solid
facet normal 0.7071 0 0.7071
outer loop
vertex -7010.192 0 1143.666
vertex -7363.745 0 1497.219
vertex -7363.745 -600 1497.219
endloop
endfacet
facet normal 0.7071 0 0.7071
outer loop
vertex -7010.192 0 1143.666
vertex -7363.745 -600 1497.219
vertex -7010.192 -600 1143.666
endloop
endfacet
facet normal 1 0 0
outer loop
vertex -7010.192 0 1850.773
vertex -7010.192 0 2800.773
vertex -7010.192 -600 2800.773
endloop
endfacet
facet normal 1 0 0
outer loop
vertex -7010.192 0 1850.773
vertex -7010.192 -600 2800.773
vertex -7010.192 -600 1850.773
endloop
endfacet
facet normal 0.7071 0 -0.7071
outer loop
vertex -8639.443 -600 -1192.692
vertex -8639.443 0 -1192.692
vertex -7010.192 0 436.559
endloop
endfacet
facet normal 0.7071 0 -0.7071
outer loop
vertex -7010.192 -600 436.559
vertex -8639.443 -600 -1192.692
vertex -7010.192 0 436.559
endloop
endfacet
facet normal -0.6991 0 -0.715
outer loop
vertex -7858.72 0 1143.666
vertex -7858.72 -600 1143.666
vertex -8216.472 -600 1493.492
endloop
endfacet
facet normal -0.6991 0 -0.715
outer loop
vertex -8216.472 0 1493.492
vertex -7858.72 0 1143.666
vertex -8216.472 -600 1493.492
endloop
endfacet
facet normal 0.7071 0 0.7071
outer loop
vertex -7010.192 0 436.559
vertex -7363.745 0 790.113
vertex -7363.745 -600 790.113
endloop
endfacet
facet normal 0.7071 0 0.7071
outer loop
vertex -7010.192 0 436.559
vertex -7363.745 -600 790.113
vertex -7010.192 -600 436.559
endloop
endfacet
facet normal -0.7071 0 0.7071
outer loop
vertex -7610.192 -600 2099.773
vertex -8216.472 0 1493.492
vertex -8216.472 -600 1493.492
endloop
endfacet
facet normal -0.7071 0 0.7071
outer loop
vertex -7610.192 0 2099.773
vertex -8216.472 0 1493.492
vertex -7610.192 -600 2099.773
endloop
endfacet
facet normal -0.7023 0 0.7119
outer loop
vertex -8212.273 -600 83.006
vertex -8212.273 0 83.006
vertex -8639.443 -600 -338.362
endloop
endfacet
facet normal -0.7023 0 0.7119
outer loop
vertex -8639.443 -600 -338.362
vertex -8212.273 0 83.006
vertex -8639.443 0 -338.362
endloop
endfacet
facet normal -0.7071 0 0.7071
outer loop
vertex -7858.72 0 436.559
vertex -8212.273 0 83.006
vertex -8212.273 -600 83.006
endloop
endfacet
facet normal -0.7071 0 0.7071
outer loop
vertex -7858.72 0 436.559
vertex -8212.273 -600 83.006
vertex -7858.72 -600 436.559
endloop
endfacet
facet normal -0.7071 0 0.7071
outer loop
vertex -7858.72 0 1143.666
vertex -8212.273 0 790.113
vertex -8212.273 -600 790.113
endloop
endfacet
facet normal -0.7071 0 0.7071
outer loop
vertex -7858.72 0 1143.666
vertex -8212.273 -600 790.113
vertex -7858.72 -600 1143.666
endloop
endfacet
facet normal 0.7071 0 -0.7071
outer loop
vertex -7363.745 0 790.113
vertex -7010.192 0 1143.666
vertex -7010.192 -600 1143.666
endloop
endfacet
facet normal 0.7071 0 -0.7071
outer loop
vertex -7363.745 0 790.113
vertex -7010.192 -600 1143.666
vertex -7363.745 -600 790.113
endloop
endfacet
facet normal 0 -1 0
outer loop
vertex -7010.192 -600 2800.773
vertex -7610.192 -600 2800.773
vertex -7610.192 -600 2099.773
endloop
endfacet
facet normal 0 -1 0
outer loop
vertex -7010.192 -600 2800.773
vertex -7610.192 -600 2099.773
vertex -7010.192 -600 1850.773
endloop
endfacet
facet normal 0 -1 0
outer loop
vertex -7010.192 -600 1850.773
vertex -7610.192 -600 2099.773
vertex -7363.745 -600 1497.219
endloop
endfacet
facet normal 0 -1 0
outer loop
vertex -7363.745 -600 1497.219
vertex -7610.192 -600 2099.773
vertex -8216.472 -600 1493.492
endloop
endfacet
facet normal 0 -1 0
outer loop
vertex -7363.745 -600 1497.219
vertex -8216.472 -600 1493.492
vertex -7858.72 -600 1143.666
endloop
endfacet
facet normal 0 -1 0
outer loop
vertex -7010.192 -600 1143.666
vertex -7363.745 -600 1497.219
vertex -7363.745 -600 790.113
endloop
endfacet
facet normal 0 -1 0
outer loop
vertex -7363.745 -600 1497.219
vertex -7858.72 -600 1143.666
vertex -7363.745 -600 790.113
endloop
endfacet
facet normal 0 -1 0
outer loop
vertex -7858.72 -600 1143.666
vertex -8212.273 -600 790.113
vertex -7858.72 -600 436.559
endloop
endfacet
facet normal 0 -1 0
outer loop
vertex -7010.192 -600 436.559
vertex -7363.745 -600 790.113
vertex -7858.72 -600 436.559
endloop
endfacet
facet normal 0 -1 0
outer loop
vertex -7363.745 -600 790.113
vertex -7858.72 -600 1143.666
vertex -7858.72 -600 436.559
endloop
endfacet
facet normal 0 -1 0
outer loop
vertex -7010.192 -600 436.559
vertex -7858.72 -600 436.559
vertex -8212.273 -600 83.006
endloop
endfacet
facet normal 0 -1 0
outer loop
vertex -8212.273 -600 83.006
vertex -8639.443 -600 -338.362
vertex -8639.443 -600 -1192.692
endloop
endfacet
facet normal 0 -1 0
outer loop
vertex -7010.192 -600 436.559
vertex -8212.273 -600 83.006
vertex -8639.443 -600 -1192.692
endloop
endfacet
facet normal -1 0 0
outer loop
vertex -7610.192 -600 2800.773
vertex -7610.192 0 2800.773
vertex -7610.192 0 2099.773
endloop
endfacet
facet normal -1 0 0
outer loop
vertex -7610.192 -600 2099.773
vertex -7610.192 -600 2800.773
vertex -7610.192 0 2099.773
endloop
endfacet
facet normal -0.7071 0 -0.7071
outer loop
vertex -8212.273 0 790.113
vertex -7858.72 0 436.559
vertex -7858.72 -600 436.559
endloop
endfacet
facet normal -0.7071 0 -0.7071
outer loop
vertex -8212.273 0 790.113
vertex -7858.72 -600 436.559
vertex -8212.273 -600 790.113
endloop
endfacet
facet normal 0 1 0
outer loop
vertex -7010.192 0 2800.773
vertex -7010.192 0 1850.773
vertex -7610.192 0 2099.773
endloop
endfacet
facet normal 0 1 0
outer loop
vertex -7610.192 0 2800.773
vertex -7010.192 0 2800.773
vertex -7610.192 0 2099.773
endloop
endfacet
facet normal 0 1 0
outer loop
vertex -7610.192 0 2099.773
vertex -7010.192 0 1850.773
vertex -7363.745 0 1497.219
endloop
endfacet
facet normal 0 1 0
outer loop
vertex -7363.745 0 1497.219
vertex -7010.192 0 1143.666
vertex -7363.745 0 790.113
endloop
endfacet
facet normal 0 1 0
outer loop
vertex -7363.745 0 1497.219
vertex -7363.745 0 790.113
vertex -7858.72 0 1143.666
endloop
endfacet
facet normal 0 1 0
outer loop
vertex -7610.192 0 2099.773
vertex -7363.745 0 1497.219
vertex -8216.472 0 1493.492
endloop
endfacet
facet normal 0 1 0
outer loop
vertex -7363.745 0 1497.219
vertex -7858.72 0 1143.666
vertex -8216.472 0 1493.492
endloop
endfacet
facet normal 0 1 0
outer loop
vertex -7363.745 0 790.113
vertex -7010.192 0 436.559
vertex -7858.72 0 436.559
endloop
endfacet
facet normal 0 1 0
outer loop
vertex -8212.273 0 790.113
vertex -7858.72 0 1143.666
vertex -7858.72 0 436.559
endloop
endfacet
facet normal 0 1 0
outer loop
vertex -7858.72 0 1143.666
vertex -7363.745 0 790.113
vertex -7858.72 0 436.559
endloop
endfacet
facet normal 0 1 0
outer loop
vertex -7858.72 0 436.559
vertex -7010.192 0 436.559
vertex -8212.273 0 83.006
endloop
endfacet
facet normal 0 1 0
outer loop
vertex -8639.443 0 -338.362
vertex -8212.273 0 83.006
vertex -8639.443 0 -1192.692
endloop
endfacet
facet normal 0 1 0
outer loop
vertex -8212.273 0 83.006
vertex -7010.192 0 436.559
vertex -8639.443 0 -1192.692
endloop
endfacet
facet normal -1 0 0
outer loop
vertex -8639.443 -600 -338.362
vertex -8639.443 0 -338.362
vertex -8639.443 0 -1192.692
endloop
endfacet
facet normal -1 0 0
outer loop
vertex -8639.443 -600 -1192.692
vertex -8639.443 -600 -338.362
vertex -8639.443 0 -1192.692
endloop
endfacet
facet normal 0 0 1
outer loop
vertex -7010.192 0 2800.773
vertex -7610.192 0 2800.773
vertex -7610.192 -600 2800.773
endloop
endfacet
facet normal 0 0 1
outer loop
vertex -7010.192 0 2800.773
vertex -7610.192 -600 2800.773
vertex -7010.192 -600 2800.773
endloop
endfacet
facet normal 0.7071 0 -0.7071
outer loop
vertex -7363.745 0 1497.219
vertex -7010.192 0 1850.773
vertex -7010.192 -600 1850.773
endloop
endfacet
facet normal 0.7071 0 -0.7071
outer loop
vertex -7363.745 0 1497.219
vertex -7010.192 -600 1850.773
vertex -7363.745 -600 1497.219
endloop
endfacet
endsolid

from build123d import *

# Parameters (mm, degrees)
BOSS_EXTRUDE1_DEPTH      = 600
CUT_EXTRUDE9_DEPTH       = 8723.868006427
CUT_EXTRUDE9_DEPTH_BACK  = 8723.868006427
CUT_EXTRUDE_THIN1_DEPTH  = 8723.868006427
CUT_EXTRUDE40_DEPTH      = 400
CUT_EXTRUDE42_DEPTH      = 8272.33671098
CUT_EXTRUDE42_DEPTH_BACK = 8272.33671098
CUT_EXTRUDE43_DEPTH      = 200
CUT_EXTRUDE44_DEPTH      = 8662.204945729
CUT_EXTRUDE44_DEPTH_BACK = 8662.204945729
SKETCH20_W               = 1000
SKETCH20_H               = 600
CUT_EXTRUDE45_DEPTH      = 600
CUT_EXTRUDE46_DEPTH      = 600
BOSS_EXTRUDE2_DEPTH      = 600
BOSS_EXTRUDE3_DEPTH      = 600
BOSS_EXTRUDE4_DEPTH      = 600
BOSS_EXTRUDE5_REACH      = 8720.017
SKETCH27_W               = 600.055718855
SKETCH27_H               = 600
SKETCH41_W               = 5944.592645119
SKETCH41_H               = 1845.640359894
CUT_EXTRUDE49_DEPTH      = 10020
SKETCH42_W               = 3231.101034248
SKETCH42_H               = 2243.42822902
CUT_EXTRUDE50_DEPTH      = 10020


with BuildPart() as part:
    # Sketch1 → Boss-Extrude1 (new body)
    with BuildSketch(Plane(origin=(0, 0, 0), x_dir=(1, 0, 0), z_dir=(0, 1, 0))):
        Polygon((0, 0), (-1000, 0), (-2062.518408918, -284.700949613), (-3015.146353081, -834.700949613), (-3792.963812386, -1612.518408918), (-4570.781271691, -2390.335868223), (-4695.045340403, -2485.687041782), (-5647.673284566, -3035.687041782), (-5792.381857505, -3095.627295285), (-6854.900266423, -3380.328244897), (-7010.191693484, -3400.772749124), (-8010.191693484, -3400.772749124), (-8010.191693484, -2800.772749124), (-7010.191693484, -2800.772749124), (-5947.673284566, -2516.071799511), (-4995.045340403, -1966.071799511), (-4217.227881098, -1188.254340206), (-3439.410421793, -410.436880901), (-3315.146353081, -315.085707342), (-2362.518408918, 234.914292658), (-2217.809835979, 294.854546161), (-1155.291427062, 579.555495773), (-1000, 600), (0, 600), align=None)
    extrude(amount=-BOSS_EXTRUDE1_DEPTH)

    # Sketch7 → Cut-Extrude9 (cut, two sides)
    with BuildSketch(Plane.XY) as cut_extrude9_sk:
        Polygon((-1000, 14081.643483175), (-1000, 0), (-1000, -600), (-2062.518408918, -400), (-3015.146353081, -400), (-3015.146353081, 0), (-3015.146353081, 14081.643483175), (-3015.146353081, 42244.930449524), (-1000, 42244.930449524), align=None)
    extrude(amount=CUT_EXTRUDE9_DEPTH, mode=Mode.SUBTRACT)
    extrude(cut_extrude9_sk.sketch, amount=-CUT_EXTRUDE9_DEPTH_BACK, mode=Mode.SUBTRACT)


with BuildPart() as cut_extrude9_piece_1:
    # of the separate pieces the step leaves, piece 1, a body of its own (cut_extrude9_pieces)
    add(part.part.solids().sort_by_distance((-2062.518408918, -400, 284.700949613))[0])

    # Sketch14 → Cut-Extrude40 (cut)
    with BuildSketch(Plane(origin=(0, -400, 0), x_dir=(1, 0, 0), z_dir=(0, 1, 0))):
        Polygon((-3015.146353081, -834.700949613), (-3439.410421793, -410.436880901), (-3315.146353081, -315.085707342), (-3015.146353081, -141.880626585), align=None)
    extrude(amount=CUT_EXTRUDE40_DEPTH, mode=Mode.SUBTRACT)

    # Sketch17 → Cut-Extrude42 (cut, two sides)
    with BuildSketch(Plane(origin=(-1090.222701734, 0, -1090.222701734), x_dir=(0.7071067811865475, 0, -0.7071067811865477), z_dir=(0.7071067811865477, 0, 0.7071067811865475))) as cut_extrude42_sk:
        Polygon((-4922.253134267, 10770.157285422), (-4922.253134267, 0), (-4922.253134267, -200), (-2722.253134267, -400), (-2722.253134267, 0), (-2722.253134267, 10770.157285422), (-2722.253134267, 32310.471856265), (-4922.253134267, 32310.471856265), align=None)
    extrude(amount=CUT_EXTRUDE42_DEPTH, mode=Mode.SUBTRACT)
    extrude(cut_extrude42_sk.sketch, amount=-CUT_EXTRUDE42_DEPTH_BACK, mode=Mode.SUBTRACT)

    # Sketch18 → Cut-Extrude43 (cut)
    with BuildSketch(Plane(origin=(0, 0, 0), x_dir=(1, 0, 0), z_dir=(0, 1, 0))):
        Polygon((-4570.781271691, -2390.335868223), (-4995.045340403, -1966.071799511), (-5947.673284566, -2516.071799511), (-5792.381857505, -3095.627295285), (-5647.673284566, -3035.687041782), (-4695.045340403, -2485.687041782), align=None)
    extrude(amount=-CUT_EXTRUDE43_DEPTH, mode=Mode.SUBTRACT)

    # Sketch19 → Cut-Extrude44 (cut, two sides)
    with BuildSketch(Plane(origin=(385.890813578, 0, 1440.164122449), x_dir=(0.9659258262890701, 0, -0.2588190451025142), z_dir=(0.2588190451025142, 0, 0.9659258262890701))) as cut_extrude44_sk:
        Polygon((-7496.218532451, 0), (-6396.218532451, -200), (-6396.218532451, 0), align=None)
    extrude(amount=CUT_EXTRUDE44_DEPTH, mode=Mode.SUBTRACT)
    extrude(cut_extrude44_sk.sketch, amount=-CUT_EXTRUDE44_DEPTH_BACK, mode=Mode.SUBTRACT)

    # Sketch20 → Cut-Extrude45 (cut)
    with BuildSketch(Plane(origin=(0, 0, 0), x_dir=(1, 0, 0), z_dir=(0, 1, 0))):
        with Locations((-7510.191693484, -3100.772749124)):
            Rectangle(SKETCH20_W, SKETCH20_H)
    extrude(amount=-CUT_EXTRUDE45_DEPTH, mode=Mode.SUBTRACT)

    # Sketch22 → Boss-Extrude2 (add)
    with BuildSketch(Plane(origin=(0, 0, 0), x_dir=(1, 0, 0), z_dir=(0, 1, 0))):
        Polygon((-7010.191693484, -3400.772749124), (-7610.191693484, -3400.772749124), (-7610.191693484, -2099.772749124), (-7010.191693484, -1850.772749124), (-7010.191693484, -2800.772749124), align=None)
    extrude(amount=-BOSS_EXTRUDE2_DEPTH)

    # Sketch23 → Boss-Extrude3 (add)
    with BuildSketch(Plane(origin=(0, 0, 0), x_dir=(1, 0, 0), z_dir=(0, 1, 0))):
        Polygon((-7010.191693484, -1850.772749124), (-7363.745084077, -1497.219358531), (-7010.191693484, -1143.665967937), (-7363.745084077, -790.112577344), (-7010.191693484, -436.559186751), (-7369.52720003, -77.223680205), (-7793.791268742, 347.040388507), (-7858.719830908, 270.547594436), (-8212.273221501, -83.005796158), (-7858.719830908, -436.559186751), (-8212.273221501, -790.112577344), (-7858.719830908, -1143.665967937), (-8216.472118741, -1493.492323867), (-7610.191693484, -2099.772749124), align=None)
    extrude(amount=-BOSS_EXTRUDE3_DEPTH)

    # Sketch27 → Boss-Extrude5 (add, up to next)
    with BuildSketch(Plane(origin=(-4176.549949048, 0, -4064.239704482), x_dir=(0.6974051569050131, 0, -0.7166770870638283), z_dir=(0.7166770870638283, 0, 0.6974051569050131)), mode=Mode.PRIVATE) as boss_extrude5_sk1:
        with Locations((-5486.74218736, -300)):
            Rectangle(SKETCH27_W, SKETCH27_H)
    boss_extrude5_tool1 = extrude(boss_extrude5_sk1.sketch, amount=BOSS_EXTRUDE5_REACH, mode=Mode.PRIVATE) - cut_extrude9_piece_1.part


with BuildPart() as cut_extrude9_piece_2:
    # of the separate pieces the step leaves, piece 2, a body of its own (cut_extrude9_pieces)
    add(part.part.solids().sort_by_distance((0, 0, 0))[0])

    # Sketch8 → Cut-Extrude-Thin1 (cut, through all)
    with BuildSketch(Plane.XY):
        Polygon((-1000, 0), (-1000, -600), (0, -600), (0, 0), (-10, 0), (-10, -590), (-990, -590), (-990, 0), align=None)
        Polygon((-4695.045340403, 0), (-4695.045340403, -200), (-4570.781271691, -200), (-3015.146353081, -400), (-3013.871199655, -390.081634019), (-4570.141081915, -190), (-4685.045340403, -190), (-4685.045340403, 0), align=None)
    extrude(amount=-CUT_EXTRUDE_THIN1_DEPTH, mode=Mode.SUBTRACT)

    # Sketch21 → Cut-Extrude46 (cut)
    with BuildSketch(Plane(origin=(0, 0, 0), x_dir=(1, 0, 0), z_dir=(0, 1, 0))):
        Polygon((0, 0), (-10, 600), (-990, 600), (-1000, 0), align=None)
    extrude(amount=-CUT_EXTRUDE46_DEPTH, mode=Mode.SUBTRACT)


with BuildPart() as body_2:
    # Sketch24 → Boss-Extrude4 (new body)
    with BuildSketch(Plane(origin=(0, 0, 0), x_dir=(1, 0, 0), z_dir=(0, 1, 0))):
        Polygon((-8212.273221501, -83.005796158), (-8639.443107058, 338.362406502), (-8639.443107058, 1192.692226823), (-7793.791268742, 347.040388507), align=None)
    extrude(amount=-BOSS_EXTRUDE4_DEPTH)


with BuildPart() as cut_extrude9_piece_1_1:
    add(cut_extrude9_piece_1.part)

    add(body_2.part)  # Boss-Extrude5 merges body 2
    add(boss_extrude5_tool1.solids().sort_by_distance((-8003.032245, -300, -132.017296))[0])

    # Sketch41 → Cut-Extrude49 (cut)
    with BuildSketch(Plane(origin=(-7010.191693484, 0, 0), x_dir=(0, 0, -1), z_dir=(1, 0, 0))):
        with Locations((-1423.304755155, -22.132559393)):
            Rectangle(SKETCH41_W, SKETCH41_H)
    extrude(amount=CUT_EXTRUDE49_DEPTH, mode=Mode.SUBTRACT)

    # Sketch42 → Cut-Extrude50 (cut)
    with BuildSketch(Plane.XY.offset(2800.772749124)):
        with Locations((-8030.549378888, -410.822906144)):
            Rectangle(SKETCH42_W, SKETCH42_H)
    extrude(amount=CUT_EXTRUDE50_DEPTH, mode=Mode.SUBTRACT)


solid = cut_extrude9_piece_1_1.part
